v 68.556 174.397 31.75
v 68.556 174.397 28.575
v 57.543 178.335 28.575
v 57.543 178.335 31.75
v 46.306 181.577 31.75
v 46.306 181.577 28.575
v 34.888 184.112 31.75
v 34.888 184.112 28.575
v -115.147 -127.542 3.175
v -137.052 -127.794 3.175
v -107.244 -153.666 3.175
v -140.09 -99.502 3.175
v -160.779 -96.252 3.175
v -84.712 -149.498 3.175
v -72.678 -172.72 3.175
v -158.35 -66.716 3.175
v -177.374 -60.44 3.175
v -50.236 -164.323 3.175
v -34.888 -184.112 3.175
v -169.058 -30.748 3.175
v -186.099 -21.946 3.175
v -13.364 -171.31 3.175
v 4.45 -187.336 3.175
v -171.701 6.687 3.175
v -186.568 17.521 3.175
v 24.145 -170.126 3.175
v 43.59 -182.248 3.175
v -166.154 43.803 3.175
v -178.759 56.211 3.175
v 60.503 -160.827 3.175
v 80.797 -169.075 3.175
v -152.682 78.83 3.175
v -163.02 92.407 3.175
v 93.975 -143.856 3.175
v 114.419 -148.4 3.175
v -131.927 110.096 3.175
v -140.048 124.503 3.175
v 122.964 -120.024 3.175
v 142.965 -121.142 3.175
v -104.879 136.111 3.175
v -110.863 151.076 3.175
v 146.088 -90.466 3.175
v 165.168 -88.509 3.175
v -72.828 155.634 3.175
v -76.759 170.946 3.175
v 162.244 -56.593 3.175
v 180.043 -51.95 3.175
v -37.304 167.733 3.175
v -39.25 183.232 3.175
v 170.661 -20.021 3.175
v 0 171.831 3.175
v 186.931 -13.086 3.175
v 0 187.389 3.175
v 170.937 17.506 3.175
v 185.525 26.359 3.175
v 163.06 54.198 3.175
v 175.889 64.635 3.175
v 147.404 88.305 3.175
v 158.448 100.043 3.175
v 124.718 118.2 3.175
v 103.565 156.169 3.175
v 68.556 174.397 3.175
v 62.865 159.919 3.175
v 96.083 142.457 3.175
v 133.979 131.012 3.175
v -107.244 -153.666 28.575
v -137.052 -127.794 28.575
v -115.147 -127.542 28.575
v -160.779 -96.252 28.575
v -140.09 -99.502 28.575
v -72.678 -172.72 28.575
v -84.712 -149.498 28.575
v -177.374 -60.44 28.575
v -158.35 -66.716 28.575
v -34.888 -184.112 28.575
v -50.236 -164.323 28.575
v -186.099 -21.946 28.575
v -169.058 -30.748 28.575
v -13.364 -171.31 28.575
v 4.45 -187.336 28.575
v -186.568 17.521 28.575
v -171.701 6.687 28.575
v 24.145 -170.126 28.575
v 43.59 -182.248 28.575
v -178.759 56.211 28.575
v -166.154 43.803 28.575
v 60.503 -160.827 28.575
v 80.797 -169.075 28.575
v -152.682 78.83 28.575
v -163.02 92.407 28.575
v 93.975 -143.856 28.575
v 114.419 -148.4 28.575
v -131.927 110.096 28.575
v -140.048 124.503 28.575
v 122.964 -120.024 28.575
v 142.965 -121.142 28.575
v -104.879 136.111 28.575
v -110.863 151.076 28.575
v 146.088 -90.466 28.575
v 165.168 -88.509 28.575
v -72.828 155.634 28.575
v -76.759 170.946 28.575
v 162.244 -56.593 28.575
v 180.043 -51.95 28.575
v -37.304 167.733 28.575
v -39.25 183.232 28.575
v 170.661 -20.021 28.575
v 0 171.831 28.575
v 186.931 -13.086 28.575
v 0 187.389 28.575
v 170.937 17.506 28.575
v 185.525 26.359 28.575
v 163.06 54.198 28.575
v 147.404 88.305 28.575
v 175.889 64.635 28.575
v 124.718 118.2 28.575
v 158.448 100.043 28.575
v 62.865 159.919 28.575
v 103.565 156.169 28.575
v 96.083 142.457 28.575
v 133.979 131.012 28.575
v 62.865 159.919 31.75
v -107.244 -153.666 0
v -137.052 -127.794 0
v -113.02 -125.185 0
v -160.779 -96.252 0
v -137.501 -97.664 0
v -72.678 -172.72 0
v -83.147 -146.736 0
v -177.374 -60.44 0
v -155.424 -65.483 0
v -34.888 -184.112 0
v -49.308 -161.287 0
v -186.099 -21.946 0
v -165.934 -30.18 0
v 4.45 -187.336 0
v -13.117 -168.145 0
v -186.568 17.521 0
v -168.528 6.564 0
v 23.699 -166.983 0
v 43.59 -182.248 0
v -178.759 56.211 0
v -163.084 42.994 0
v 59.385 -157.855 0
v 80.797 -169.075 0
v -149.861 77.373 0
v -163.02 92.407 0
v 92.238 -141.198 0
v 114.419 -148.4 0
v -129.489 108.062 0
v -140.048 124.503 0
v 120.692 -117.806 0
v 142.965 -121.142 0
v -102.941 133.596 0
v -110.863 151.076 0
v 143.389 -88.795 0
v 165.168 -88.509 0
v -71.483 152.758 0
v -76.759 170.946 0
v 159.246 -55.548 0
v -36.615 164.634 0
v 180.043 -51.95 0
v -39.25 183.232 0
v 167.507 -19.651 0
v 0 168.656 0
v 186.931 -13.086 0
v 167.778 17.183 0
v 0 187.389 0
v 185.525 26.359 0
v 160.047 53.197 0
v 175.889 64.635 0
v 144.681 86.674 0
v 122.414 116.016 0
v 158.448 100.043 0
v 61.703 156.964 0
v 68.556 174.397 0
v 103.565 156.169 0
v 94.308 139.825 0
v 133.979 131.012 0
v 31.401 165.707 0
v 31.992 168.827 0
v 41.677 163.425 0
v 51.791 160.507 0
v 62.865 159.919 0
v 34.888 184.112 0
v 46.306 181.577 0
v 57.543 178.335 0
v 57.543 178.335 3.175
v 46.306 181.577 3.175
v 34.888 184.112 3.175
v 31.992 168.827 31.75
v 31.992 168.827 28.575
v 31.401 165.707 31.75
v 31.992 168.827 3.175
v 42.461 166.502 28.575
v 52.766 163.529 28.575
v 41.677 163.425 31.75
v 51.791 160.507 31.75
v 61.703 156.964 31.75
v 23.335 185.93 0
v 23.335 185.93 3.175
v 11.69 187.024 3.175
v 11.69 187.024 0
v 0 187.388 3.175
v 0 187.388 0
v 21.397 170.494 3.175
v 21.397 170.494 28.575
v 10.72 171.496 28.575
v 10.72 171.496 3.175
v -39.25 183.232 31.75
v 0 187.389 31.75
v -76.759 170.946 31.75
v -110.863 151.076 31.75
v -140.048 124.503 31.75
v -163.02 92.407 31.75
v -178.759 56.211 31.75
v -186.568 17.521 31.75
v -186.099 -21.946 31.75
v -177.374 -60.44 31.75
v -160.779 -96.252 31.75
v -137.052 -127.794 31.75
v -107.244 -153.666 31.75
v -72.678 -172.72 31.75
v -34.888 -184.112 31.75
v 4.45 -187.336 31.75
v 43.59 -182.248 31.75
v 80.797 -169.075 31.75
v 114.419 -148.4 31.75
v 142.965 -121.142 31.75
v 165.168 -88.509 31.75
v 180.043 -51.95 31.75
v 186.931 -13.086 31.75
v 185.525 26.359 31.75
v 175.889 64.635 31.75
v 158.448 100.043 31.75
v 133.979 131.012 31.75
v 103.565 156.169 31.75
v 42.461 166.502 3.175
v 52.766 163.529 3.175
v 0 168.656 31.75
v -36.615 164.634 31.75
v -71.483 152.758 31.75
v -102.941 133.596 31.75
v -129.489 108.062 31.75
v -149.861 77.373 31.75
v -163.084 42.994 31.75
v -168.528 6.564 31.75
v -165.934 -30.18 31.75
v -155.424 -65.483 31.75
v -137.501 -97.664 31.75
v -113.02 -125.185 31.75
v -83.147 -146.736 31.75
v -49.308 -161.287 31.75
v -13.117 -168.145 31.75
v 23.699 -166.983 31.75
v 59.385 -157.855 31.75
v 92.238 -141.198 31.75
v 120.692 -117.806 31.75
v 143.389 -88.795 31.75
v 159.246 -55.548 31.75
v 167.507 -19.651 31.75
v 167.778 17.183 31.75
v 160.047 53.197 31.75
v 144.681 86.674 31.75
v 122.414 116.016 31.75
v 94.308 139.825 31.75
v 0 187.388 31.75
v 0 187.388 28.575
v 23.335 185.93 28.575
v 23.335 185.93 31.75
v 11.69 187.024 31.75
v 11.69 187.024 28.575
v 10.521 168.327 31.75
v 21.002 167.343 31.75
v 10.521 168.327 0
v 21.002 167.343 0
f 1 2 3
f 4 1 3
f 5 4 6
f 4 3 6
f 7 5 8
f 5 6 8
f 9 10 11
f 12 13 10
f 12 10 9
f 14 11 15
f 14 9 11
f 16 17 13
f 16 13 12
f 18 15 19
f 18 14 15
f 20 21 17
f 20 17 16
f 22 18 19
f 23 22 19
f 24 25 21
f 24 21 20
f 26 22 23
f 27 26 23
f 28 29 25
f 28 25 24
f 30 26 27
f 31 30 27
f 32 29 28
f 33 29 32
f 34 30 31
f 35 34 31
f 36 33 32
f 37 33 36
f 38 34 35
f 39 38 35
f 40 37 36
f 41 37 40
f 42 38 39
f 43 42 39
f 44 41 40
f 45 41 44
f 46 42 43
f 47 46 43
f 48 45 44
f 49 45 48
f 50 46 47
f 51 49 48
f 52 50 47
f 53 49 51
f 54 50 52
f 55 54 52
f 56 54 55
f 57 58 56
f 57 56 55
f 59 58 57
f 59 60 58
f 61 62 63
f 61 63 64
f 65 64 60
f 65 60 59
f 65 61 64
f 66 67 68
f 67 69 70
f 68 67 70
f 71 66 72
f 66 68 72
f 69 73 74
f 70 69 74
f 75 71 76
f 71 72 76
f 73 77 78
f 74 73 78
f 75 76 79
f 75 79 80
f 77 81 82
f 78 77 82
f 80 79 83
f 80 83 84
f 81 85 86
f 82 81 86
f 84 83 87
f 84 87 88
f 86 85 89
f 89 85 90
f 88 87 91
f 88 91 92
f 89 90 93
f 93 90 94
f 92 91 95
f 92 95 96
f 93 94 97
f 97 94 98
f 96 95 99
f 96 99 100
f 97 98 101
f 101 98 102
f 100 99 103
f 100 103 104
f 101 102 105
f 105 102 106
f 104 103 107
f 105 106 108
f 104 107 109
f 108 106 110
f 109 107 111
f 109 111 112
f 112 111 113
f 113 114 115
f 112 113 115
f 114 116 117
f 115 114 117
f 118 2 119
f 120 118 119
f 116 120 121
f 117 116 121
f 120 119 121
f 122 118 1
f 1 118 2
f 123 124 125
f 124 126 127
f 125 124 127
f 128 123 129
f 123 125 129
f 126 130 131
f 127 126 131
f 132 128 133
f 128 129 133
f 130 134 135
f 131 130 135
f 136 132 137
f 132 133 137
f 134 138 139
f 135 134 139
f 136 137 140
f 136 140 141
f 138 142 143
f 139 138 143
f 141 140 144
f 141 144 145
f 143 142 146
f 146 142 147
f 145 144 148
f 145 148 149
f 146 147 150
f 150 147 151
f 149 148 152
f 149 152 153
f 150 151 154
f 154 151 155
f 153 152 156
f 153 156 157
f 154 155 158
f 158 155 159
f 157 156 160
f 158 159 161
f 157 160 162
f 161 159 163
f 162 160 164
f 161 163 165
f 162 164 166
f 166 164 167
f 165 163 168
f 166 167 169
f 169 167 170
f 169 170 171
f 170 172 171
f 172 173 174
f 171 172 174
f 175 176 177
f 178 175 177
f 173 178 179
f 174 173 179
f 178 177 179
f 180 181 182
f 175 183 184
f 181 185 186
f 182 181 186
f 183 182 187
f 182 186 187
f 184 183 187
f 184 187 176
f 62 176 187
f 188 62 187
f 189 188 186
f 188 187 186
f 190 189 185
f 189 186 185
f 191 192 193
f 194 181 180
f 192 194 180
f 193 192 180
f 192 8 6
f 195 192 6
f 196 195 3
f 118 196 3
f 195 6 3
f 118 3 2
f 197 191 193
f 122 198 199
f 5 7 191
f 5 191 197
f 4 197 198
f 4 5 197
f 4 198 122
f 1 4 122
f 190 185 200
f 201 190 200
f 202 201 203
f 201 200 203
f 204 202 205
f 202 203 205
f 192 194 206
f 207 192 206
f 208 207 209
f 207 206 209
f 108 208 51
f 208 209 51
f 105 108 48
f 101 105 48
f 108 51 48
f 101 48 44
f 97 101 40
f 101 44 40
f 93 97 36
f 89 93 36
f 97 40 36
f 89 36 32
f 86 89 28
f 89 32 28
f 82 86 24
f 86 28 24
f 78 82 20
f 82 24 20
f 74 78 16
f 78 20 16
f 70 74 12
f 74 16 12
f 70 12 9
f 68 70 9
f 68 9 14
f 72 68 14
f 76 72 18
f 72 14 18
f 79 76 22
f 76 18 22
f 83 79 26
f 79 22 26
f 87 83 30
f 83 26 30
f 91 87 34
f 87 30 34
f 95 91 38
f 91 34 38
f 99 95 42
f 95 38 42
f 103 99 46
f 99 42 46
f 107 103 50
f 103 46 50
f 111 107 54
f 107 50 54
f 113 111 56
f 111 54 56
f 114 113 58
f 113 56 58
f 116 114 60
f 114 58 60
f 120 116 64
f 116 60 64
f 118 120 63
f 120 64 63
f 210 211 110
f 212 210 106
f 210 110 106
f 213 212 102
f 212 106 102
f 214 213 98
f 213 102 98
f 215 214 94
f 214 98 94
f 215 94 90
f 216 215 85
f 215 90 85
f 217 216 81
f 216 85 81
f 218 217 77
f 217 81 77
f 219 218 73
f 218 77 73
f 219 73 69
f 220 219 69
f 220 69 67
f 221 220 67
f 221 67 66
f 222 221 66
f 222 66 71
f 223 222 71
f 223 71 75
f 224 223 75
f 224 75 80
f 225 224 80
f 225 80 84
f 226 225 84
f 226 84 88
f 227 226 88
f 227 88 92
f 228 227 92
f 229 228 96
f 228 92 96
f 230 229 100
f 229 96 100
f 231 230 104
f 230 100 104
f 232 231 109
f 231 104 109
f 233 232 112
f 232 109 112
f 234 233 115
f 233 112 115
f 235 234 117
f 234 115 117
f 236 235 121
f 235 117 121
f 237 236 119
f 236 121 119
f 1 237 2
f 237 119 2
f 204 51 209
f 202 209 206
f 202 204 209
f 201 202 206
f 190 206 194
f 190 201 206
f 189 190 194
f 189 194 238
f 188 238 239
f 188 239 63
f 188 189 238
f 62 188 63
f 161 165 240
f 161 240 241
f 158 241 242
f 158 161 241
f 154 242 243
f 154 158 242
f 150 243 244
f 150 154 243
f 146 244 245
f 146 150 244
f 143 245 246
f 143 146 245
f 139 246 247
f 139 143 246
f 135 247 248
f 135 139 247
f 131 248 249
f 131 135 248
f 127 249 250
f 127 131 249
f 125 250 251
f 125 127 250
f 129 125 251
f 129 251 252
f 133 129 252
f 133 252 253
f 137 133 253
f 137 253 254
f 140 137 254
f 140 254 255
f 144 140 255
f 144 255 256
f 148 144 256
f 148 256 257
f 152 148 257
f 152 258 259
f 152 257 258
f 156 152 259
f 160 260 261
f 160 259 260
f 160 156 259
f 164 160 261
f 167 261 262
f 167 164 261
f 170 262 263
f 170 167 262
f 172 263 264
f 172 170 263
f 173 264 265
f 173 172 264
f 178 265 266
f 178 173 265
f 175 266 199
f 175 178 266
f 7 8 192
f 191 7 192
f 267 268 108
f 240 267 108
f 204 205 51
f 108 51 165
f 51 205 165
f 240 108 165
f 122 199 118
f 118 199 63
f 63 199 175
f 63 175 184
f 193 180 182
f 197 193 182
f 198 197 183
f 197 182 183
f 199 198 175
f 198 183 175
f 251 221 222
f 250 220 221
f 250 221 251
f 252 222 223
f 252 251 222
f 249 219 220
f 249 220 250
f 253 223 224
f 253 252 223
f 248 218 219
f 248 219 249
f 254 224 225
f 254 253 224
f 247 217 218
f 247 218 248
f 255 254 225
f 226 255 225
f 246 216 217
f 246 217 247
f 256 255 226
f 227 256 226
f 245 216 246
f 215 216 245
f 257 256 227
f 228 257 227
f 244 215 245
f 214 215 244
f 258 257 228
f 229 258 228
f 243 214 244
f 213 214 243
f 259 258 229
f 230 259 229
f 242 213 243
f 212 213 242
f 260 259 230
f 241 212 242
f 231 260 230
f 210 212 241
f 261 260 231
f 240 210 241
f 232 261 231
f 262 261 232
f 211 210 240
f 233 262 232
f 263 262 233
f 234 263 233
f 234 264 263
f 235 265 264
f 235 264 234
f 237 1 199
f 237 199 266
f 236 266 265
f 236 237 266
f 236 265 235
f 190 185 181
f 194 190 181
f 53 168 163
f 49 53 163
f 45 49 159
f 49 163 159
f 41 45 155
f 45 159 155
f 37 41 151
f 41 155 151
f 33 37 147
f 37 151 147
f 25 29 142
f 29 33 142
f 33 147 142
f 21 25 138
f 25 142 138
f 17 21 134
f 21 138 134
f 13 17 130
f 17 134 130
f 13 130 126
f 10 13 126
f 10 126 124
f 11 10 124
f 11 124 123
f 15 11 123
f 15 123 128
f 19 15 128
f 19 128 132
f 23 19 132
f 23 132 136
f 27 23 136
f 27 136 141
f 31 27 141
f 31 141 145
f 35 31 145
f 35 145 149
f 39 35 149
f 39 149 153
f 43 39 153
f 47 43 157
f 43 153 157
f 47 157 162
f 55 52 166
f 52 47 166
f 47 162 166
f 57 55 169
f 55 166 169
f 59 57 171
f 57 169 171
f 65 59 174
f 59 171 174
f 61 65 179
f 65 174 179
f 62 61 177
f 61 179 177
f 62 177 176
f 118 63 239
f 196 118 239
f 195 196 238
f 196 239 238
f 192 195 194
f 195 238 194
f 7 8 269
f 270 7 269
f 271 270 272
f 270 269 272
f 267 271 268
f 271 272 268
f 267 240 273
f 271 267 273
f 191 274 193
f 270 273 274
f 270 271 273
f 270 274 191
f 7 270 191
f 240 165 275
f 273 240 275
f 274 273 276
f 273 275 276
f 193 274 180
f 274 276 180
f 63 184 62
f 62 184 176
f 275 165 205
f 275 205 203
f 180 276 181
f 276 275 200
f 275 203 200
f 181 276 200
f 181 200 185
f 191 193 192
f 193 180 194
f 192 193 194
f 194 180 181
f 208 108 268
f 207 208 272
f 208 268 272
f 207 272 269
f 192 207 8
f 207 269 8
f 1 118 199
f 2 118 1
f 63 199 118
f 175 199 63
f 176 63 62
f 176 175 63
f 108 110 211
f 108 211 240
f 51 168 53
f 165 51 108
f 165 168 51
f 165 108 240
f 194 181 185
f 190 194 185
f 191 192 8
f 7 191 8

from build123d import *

# Parameters (mm, degrees)
SKETCH2_R           = 187.3885
SKETCH2_R_2         = 168.656
BOSS_EXTRUDE1_DEPTH = 3.175
SKETCH3_R           = 171.831
SKETCH3_R_2         = 168.656
BOSS_EXTRUDE2_DEPTH = 25.4
SKETCH4_R           = 187.3885
SKETCH4_R_2         = 168.656
BOSS_EXTRUDE3_DEPTH = 3.175
SPLIT3_DEPTH        = 31.75
SPLIT3_2_DEPTH      = 3.175
SPLIT3_START        = 28.575
SPLIT3_3_DEPTH      = 3.175
SPLIT3_4_DEPTH      = 31.75
SPLIT3_5_DEPTH      = 31.75
SPLIT3_6_DEPTH      = 3.175
SPLIT3_7_DEPTH      = 3.175


# Read off the part's stored shape, not the designer's step: Split3
with BuildPart() as part:
    # Sketch2 → Boss-Extrude1 (new body)
    with BuildSketch(Plane.XY):
        Circle(SKETCH2_R)
        Circle(SKETCH2_R_2, mode=Mode.SUBTRACT)
    extrude(amount=BOSS_EXTRUDE1_DEPTH)

    # Sketch3 → Boss-Extrude2 (add)
    with BuildSketch(Plane.XY.offset(3.175)):
        Circle(SKETCH3_R)
        Circle(SKETCH3_R_2, mode=Mode.SUBTRACT)
    extrude(amount=BOSS_EXTRUDE2_DEPTH)

    # Sketch4 → Boss-Extrude3 (add)
    with BuildSketch(Plane.XY.offset(28.575)):
        Circle(SKETCH4_R)
        Circle(SKETCH4_R_2, mode=Mode.SUBTRACT)
    extrude(amount=BOSS_EXTRUDE3_DEPTH)

    # Split3 4 outline → Split3 4 (cut)
    with BuildSketch(Plane.XY):
        with BuildLine():
            ThreePointArc((0, 168.656), (31.400557033, 165.707125236), (61.703064661, 156.963620459))
            Line((61.703064661, 156.963620459), (68.556379448, 174.397456315))
            ThreePointArc((68.556379448, 174.397456315), (34.888194203, 184.112095848), (0, 187.3885))
            Line((0, 187.3885), (0, 168.656))
        make_face()
    extrude(amount=SPLIT3_4_DEPTH, mode=Mode.SUBTRACT)


with BuildPart() as body_2:
    # Split3 outline → Split3 (new body)
    with BuildSketch(Plane.XY):
        with BuildLine():
            Line((0, 171.831), (0, 168.656))
            ThreePointArc((0, 168.656), (15.769359882, 167.917162985), (31.400557033, 165.707125236))
            Line((31.400557033, 165.707125236), (31.991681977, 168.826611781))
            ThreePointArc((31.991681977, 168.826611781), (16.066222832, 171.078254156), (0, 171.831))
        make_face()
    extrude(amount=SPLIT3_DEPTH)

    # Split3 2 outline → Split3 2 (add)
    with BuildSketch(Plane.XY):
        with BuildLine():
            Line((0, 187.3885), (0, 171.831))
            ThreePointArc((0, 171.831), (16.066222832, 171.078254156), (31.991681977, 168.826611781))
            Line((31.991681977, 168.826611781), (34.888194203, 184.112095848))
            ThreePointArc((34.888194203, 184.112095848), (17.520851284, 186.567600892), (0, 187.3885))
        make_face()
    extrude(amount=SPLIT3_2_DEPTH)

    # Split3 3 outline → Split3 3 (add)
    with BuildSketch(Plane.XY.offset(SPLIT3_START)):
        with BuildLine():
            Line((0, 187.3885), (0, 171.831))
            ThreePointArc((0, 171.831), (16.066222832, 171.078254156), (31.991681977, 168.826611781))
            Line((31.991681977, 168.826611781), (34.888194203, 184.112095848))
            ThreePointArc((34.888194203, 184.112095848), (17.520851284, 186.567600892), (0, 187.3885))
        make_face()
    extrude(amount=SPLIT3_3_DEPTH)


with BuildPart() as body_3:
    # Split3 5 outline → Split3 5 (new body)
    with BuildSketch(Plane.XY):
        with BuildLine():
            Line((31.991681977, 168.826611781), (31.400557033, 165.707125236))
            ThreePointArc((31.400557033, 165.707125236), (46.75663923, 162.045249927), (61.703064661, 156.963620459))
            Line((61.703064661, 156.963620459), (62.864643438, 159.918507892))
            ThreePointArc((62.864643438, 159.918507892), (47.636847047, 165.095800566), (31.991681977, 168.826611781))
        make_face()
    extrude(amount=SPLIT3_5_DEPTH)

    # Split3 6 outline → Split3 6 (add)
    with BuildSketch(Plane.XY):
        with BuildLine():
            Line((34.888194203, 184.112095848), (31.991681977, 168.826611781))
            ThreePointArc((31.991681977, 168.826611781), (47.636847047, 165.095800566), (62.864643438, 159.918507892))
            Line((62.864643438, 159.918507892), (68.556379448, 174.397456315))
            ThreePointArc((68.556379448, 174.397456315), (51.949865349, 180.043498695), (34.888194203, 184.112095848))
        make_face()
    extrude(amount=SPLIT3_6_DEPTH)

    # Split3 7 outline → Split3 7 (add)
    with BuildSketch(Plane.XY.offset(SPLIT3_START)):
        with BuildLine():
            Line((34.888194203, 184.112095848), (31.991681977, 168.826611781))
            ThreePointArc((31.991681977, 168.826611781), (47.636847047, 165.095800566), (62.864643438, 159.918507892))
            Line((62.864643438, 159.918507892), (68.556379448, 174.397456315))
            ThreePointArc((68.556379448, 174.397456315), (51.949865349, 180.043498695), (34.888194203, 184.112095848))
        make_face()
    extrude(amount=SPLIT3_7_DEPTH)


solid = Compound([part.part, body_2.part, body_3.part])
